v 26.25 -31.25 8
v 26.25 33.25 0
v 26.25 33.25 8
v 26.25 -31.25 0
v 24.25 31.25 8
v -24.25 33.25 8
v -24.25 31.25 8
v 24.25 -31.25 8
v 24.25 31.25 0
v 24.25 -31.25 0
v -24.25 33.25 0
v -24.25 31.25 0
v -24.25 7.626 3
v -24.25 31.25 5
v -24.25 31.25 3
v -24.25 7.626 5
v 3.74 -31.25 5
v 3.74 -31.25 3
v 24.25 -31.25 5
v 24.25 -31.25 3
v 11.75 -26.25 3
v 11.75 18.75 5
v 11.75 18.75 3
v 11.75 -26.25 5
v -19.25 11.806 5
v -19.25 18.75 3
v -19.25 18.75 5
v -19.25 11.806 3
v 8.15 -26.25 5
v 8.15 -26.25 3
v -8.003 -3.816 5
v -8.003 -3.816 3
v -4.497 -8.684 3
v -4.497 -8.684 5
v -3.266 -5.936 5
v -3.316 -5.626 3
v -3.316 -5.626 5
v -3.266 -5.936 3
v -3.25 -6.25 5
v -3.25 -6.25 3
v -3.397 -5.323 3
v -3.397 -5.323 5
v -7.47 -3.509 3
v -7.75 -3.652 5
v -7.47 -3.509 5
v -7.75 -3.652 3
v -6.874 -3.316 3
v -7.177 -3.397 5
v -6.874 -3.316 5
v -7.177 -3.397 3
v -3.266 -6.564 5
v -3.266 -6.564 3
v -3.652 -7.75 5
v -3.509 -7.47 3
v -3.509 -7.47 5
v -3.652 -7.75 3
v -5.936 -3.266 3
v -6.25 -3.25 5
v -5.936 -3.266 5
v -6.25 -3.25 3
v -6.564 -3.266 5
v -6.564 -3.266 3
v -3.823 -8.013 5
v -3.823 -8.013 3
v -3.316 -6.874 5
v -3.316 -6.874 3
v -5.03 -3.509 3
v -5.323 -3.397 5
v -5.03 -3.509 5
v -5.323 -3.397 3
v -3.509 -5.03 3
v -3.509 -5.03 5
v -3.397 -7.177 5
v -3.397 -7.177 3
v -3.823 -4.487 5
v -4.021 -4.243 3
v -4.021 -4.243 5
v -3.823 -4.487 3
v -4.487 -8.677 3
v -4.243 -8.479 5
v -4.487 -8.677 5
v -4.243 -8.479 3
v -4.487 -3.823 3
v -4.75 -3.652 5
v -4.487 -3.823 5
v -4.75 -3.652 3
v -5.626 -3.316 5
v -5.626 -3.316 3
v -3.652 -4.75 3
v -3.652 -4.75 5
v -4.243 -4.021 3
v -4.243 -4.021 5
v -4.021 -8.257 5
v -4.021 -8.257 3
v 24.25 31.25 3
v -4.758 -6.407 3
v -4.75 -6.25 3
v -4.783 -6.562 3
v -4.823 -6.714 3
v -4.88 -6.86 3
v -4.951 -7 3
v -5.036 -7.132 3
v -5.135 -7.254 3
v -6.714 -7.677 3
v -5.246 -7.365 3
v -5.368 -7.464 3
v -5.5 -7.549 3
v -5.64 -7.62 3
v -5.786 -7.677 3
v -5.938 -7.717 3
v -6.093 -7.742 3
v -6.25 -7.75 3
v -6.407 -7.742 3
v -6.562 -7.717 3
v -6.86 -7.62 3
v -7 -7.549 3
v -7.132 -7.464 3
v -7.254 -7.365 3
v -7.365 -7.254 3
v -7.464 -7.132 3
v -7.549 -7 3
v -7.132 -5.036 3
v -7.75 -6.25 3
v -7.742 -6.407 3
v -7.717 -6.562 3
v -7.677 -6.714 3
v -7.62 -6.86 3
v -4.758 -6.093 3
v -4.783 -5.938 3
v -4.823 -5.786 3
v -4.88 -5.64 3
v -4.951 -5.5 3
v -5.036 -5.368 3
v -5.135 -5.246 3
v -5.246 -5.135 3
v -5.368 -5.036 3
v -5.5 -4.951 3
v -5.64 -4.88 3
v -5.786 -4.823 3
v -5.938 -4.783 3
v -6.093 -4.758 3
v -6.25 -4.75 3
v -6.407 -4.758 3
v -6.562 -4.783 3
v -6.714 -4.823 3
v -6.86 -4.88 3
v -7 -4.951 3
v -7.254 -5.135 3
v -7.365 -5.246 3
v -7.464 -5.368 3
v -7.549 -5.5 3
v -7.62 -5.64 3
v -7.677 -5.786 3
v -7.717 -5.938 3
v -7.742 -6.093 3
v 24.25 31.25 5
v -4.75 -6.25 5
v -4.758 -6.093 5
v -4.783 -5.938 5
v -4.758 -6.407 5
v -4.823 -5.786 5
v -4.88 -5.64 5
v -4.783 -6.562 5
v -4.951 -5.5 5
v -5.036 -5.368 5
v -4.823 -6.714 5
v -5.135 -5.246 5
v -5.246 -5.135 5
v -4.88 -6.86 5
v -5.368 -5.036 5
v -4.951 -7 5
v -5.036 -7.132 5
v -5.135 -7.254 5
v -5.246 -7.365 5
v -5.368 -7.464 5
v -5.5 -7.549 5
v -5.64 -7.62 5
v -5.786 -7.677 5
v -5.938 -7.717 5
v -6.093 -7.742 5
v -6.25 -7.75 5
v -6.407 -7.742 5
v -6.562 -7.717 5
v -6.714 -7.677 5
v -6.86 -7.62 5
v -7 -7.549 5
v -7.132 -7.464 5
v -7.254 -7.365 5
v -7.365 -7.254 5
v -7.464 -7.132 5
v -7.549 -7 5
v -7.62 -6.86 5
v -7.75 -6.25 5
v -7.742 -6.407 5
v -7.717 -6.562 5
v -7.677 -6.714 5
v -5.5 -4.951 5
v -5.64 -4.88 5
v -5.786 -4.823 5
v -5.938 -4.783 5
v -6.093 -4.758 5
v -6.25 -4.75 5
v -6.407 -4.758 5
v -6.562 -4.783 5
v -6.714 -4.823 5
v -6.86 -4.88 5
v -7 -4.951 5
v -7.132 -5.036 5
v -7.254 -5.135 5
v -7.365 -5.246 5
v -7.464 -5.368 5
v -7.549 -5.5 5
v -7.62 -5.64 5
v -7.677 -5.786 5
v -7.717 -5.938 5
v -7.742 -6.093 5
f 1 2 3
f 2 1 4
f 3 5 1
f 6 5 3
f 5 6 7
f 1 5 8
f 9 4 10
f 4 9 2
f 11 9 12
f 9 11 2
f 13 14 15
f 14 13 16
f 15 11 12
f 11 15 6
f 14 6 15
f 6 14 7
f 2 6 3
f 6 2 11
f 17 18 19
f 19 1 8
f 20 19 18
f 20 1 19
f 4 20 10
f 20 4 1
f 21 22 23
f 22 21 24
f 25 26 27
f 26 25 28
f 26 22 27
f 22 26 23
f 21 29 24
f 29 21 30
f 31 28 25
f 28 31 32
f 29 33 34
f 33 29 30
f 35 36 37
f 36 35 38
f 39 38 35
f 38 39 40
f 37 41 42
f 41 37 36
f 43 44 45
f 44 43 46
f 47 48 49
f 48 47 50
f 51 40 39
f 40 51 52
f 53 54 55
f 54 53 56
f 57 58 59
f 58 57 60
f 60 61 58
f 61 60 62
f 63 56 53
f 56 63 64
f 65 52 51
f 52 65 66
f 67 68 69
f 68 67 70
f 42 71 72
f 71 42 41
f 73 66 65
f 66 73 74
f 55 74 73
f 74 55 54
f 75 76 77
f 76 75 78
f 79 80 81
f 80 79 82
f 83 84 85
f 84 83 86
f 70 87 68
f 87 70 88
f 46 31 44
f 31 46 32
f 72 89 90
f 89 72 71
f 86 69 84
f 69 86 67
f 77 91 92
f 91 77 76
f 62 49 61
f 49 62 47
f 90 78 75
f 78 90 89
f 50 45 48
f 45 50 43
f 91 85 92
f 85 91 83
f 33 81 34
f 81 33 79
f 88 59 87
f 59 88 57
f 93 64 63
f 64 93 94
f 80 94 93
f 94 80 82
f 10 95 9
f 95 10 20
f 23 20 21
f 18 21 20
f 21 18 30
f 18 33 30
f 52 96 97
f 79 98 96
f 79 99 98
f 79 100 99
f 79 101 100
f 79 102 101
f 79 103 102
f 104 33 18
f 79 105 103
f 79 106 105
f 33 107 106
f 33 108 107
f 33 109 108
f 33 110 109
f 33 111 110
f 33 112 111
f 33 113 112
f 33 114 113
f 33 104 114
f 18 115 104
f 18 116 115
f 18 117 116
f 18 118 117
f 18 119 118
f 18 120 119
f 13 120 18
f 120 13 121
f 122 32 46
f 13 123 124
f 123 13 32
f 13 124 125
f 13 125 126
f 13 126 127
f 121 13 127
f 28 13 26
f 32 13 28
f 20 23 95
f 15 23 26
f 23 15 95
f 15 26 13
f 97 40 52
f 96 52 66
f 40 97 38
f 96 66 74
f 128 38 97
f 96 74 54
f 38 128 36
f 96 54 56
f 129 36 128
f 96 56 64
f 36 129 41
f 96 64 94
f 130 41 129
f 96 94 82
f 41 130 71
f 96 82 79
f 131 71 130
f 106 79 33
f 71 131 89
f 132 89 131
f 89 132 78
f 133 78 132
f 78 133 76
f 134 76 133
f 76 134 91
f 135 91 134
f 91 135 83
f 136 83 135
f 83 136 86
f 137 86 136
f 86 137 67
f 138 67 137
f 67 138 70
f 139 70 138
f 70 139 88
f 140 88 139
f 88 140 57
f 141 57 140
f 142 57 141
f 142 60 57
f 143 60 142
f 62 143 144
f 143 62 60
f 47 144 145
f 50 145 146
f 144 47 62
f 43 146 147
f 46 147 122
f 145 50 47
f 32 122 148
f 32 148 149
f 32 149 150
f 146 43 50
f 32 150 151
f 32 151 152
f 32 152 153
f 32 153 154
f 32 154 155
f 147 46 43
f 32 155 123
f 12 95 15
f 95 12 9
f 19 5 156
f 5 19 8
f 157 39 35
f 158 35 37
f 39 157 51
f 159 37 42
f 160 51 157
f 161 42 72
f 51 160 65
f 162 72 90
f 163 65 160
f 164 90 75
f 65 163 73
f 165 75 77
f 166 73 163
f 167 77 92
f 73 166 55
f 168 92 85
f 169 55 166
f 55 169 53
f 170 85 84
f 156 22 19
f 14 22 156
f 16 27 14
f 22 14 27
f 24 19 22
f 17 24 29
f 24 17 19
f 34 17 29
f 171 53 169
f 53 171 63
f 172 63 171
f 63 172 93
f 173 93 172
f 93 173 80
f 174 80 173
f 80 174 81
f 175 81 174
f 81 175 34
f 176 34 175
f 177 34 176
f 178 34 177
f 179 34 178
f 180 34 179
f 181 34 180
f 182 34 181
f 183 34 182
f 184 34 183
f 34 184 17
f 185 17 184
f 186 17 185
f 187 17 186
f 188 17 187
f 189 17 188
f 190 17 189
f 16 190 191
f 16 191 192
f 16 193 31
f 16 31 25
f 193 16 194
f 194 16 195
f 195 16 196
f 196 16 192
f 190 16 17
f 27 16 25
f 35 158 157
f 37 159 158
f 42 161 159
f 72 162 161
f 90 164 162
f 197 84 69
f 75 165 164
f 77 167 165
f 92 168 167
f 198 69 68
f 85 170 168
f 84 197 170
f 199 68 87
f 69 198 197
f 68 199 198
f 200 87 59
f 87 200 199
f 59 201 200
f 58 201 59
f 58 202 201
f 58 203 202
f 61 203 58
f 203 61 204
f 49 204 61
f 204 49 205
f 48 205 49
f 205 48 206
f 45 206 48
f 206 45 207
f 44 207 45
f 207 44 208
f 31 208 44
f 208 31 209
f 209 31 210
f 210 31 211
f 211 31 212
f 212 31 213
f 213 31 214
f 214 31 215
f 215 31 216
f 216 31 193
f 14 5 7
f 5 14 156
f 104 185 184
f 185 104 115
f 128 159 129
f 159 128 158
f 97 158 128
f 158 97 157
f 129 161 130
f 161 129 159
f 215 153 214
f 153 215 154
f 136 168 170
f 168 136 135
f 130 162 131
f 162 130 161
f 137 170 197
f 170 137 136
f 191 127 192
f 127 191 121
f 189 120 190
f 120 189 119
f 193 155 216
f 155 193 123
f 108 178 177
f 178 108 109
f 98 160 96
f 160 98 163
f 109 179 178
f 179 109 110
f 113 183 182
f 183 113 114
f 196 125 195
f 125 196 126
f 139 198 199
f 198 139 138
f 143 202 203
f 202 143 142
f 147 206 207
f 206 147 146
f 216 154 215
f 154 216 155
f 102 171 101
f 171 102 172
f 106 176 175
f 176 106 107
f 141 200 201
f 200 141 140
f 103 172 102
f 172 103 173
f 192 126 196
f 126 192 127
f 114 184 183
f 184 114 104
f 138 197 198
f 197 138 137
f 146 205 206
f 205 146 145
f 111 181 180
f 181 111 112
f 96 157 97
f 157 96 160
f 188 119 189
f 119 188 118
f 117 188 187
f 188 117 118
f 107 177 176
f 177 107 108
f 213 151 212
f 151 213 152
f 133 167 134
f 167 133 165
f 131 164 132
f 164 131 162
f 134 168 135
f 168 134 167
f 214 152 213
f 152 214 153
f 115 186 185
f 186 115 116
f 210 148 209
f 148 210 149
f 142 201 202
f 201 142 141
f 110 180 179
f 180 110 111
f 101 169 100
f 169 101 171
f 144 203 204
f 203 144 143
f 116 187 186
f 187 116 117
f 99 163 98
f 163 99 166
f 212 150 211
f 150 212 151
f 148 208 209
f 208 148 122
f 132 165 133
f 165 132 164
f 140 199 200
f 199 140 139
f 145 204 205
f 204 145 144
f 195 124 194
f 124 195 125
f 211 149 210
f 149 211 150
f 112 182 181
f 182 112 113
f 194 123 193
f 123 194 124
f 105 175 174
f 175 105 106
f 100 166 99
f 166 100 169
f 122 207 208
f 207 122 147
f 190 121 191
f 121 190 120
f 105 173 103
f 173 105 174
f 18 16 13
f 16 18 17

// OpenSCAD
// [FL_INDEX: keywords="openscad, 3d_parametric, Customizable_drilling_template, csg_solid" | COT="Parametric OpenSCAD design from 3DCodeverse"]
// Title: Customizable drilling template

/*
 * Author:  Marcelo Costa Jr.
 * License: Creative Commons Attribution-ShareAlike 3.0 Unported License
 *          see http://creativecommons.org/licenses/by-sa/3.0/
 * URL:     http://www.thingiverse.com/thing:142382
 */

// MakerBot customizer settings:
// preview[view:south east, tilt:top diagonal]

/*
 * parameters
 */

/* [parameters] */
// spacing from edge of table on the X axes (mm)
	xEsp = 12.5; 
// spacing from edge of table on the Y axes (mm)
	yEsp = 12.5; 
// dimensions of leg on the X axes (mm)
	xLeg = 36;
// dimensions of leg on the Y axes (mm)	
	yLeg = 50;
// diameter of drilling hole (mm)
	hDia = 3;// [3:12]
	
/*[hidden]*/
	hRad = hDia/2;
// a little trigonometry
	alpha = atan2(yLeg,xLeg);
	dY = (hRad+5)/cos(alpha);
	dX = (hRad+5)/sin(alpha);

// quality of the circles
$fn=60;

// edge spacer
module spacer() {
	difference() {
		// full volume
		cube([xEsp+xLeg+2,yEsp+yLeg+2,8]);
		// subtration (leg)
		translate([5,5,-1])
			cube([xLeg-5,yLeg-5,10]);
	}
}

// transversal support of drill guide
module transversal() {
	difference (){
		translate([0,0,0])
			linear_extrude(height = 8, center = false, convexity = 10, twist = 0)
				polygon(points = [[0,0],[0,yLeg],[xLeg,0]]);
	}
}
// drill guide
module drill() {
	translate([xLeg/2,yLeg/2,0])
		cylinder(h=8, r=hDia);
}

//	cuts 
module cutUpDow(){
	// subtration (downer cut)
	translate([-1,-1,-1])
		cube([xEsp+xLeg+1,yEsp+yLeg+1,4]);
	// 2nd subtration (upper cut)
	translate([-1,-1,3+2])
		cube([xEsp+xLeg+1,yEsp+yLeg+1,4]); 

}
module cutSlant() {
	translate([0,0,0])
		linear_extrude(height = 10, center = false, convexity = 10, twist = 0)
			polygon(points = [[-1,-1],[0,yLeg-dY],[xLeg-dX,0]]);
}
module cutHole() {
	translate([xLeg/2,yLeg/2,-1])
		cylinder(h=10, r=hDia/2);
}

// The actual sequence of actions
translate([-(xLeg+xEsp)/2,-(yLeg+yEsp)/2,0])
	difference(){
		union(){
			spacer();
			transversal();
			drill();
		}
		cutHole();
		cutUpDow();
		cutSlant();
	}
